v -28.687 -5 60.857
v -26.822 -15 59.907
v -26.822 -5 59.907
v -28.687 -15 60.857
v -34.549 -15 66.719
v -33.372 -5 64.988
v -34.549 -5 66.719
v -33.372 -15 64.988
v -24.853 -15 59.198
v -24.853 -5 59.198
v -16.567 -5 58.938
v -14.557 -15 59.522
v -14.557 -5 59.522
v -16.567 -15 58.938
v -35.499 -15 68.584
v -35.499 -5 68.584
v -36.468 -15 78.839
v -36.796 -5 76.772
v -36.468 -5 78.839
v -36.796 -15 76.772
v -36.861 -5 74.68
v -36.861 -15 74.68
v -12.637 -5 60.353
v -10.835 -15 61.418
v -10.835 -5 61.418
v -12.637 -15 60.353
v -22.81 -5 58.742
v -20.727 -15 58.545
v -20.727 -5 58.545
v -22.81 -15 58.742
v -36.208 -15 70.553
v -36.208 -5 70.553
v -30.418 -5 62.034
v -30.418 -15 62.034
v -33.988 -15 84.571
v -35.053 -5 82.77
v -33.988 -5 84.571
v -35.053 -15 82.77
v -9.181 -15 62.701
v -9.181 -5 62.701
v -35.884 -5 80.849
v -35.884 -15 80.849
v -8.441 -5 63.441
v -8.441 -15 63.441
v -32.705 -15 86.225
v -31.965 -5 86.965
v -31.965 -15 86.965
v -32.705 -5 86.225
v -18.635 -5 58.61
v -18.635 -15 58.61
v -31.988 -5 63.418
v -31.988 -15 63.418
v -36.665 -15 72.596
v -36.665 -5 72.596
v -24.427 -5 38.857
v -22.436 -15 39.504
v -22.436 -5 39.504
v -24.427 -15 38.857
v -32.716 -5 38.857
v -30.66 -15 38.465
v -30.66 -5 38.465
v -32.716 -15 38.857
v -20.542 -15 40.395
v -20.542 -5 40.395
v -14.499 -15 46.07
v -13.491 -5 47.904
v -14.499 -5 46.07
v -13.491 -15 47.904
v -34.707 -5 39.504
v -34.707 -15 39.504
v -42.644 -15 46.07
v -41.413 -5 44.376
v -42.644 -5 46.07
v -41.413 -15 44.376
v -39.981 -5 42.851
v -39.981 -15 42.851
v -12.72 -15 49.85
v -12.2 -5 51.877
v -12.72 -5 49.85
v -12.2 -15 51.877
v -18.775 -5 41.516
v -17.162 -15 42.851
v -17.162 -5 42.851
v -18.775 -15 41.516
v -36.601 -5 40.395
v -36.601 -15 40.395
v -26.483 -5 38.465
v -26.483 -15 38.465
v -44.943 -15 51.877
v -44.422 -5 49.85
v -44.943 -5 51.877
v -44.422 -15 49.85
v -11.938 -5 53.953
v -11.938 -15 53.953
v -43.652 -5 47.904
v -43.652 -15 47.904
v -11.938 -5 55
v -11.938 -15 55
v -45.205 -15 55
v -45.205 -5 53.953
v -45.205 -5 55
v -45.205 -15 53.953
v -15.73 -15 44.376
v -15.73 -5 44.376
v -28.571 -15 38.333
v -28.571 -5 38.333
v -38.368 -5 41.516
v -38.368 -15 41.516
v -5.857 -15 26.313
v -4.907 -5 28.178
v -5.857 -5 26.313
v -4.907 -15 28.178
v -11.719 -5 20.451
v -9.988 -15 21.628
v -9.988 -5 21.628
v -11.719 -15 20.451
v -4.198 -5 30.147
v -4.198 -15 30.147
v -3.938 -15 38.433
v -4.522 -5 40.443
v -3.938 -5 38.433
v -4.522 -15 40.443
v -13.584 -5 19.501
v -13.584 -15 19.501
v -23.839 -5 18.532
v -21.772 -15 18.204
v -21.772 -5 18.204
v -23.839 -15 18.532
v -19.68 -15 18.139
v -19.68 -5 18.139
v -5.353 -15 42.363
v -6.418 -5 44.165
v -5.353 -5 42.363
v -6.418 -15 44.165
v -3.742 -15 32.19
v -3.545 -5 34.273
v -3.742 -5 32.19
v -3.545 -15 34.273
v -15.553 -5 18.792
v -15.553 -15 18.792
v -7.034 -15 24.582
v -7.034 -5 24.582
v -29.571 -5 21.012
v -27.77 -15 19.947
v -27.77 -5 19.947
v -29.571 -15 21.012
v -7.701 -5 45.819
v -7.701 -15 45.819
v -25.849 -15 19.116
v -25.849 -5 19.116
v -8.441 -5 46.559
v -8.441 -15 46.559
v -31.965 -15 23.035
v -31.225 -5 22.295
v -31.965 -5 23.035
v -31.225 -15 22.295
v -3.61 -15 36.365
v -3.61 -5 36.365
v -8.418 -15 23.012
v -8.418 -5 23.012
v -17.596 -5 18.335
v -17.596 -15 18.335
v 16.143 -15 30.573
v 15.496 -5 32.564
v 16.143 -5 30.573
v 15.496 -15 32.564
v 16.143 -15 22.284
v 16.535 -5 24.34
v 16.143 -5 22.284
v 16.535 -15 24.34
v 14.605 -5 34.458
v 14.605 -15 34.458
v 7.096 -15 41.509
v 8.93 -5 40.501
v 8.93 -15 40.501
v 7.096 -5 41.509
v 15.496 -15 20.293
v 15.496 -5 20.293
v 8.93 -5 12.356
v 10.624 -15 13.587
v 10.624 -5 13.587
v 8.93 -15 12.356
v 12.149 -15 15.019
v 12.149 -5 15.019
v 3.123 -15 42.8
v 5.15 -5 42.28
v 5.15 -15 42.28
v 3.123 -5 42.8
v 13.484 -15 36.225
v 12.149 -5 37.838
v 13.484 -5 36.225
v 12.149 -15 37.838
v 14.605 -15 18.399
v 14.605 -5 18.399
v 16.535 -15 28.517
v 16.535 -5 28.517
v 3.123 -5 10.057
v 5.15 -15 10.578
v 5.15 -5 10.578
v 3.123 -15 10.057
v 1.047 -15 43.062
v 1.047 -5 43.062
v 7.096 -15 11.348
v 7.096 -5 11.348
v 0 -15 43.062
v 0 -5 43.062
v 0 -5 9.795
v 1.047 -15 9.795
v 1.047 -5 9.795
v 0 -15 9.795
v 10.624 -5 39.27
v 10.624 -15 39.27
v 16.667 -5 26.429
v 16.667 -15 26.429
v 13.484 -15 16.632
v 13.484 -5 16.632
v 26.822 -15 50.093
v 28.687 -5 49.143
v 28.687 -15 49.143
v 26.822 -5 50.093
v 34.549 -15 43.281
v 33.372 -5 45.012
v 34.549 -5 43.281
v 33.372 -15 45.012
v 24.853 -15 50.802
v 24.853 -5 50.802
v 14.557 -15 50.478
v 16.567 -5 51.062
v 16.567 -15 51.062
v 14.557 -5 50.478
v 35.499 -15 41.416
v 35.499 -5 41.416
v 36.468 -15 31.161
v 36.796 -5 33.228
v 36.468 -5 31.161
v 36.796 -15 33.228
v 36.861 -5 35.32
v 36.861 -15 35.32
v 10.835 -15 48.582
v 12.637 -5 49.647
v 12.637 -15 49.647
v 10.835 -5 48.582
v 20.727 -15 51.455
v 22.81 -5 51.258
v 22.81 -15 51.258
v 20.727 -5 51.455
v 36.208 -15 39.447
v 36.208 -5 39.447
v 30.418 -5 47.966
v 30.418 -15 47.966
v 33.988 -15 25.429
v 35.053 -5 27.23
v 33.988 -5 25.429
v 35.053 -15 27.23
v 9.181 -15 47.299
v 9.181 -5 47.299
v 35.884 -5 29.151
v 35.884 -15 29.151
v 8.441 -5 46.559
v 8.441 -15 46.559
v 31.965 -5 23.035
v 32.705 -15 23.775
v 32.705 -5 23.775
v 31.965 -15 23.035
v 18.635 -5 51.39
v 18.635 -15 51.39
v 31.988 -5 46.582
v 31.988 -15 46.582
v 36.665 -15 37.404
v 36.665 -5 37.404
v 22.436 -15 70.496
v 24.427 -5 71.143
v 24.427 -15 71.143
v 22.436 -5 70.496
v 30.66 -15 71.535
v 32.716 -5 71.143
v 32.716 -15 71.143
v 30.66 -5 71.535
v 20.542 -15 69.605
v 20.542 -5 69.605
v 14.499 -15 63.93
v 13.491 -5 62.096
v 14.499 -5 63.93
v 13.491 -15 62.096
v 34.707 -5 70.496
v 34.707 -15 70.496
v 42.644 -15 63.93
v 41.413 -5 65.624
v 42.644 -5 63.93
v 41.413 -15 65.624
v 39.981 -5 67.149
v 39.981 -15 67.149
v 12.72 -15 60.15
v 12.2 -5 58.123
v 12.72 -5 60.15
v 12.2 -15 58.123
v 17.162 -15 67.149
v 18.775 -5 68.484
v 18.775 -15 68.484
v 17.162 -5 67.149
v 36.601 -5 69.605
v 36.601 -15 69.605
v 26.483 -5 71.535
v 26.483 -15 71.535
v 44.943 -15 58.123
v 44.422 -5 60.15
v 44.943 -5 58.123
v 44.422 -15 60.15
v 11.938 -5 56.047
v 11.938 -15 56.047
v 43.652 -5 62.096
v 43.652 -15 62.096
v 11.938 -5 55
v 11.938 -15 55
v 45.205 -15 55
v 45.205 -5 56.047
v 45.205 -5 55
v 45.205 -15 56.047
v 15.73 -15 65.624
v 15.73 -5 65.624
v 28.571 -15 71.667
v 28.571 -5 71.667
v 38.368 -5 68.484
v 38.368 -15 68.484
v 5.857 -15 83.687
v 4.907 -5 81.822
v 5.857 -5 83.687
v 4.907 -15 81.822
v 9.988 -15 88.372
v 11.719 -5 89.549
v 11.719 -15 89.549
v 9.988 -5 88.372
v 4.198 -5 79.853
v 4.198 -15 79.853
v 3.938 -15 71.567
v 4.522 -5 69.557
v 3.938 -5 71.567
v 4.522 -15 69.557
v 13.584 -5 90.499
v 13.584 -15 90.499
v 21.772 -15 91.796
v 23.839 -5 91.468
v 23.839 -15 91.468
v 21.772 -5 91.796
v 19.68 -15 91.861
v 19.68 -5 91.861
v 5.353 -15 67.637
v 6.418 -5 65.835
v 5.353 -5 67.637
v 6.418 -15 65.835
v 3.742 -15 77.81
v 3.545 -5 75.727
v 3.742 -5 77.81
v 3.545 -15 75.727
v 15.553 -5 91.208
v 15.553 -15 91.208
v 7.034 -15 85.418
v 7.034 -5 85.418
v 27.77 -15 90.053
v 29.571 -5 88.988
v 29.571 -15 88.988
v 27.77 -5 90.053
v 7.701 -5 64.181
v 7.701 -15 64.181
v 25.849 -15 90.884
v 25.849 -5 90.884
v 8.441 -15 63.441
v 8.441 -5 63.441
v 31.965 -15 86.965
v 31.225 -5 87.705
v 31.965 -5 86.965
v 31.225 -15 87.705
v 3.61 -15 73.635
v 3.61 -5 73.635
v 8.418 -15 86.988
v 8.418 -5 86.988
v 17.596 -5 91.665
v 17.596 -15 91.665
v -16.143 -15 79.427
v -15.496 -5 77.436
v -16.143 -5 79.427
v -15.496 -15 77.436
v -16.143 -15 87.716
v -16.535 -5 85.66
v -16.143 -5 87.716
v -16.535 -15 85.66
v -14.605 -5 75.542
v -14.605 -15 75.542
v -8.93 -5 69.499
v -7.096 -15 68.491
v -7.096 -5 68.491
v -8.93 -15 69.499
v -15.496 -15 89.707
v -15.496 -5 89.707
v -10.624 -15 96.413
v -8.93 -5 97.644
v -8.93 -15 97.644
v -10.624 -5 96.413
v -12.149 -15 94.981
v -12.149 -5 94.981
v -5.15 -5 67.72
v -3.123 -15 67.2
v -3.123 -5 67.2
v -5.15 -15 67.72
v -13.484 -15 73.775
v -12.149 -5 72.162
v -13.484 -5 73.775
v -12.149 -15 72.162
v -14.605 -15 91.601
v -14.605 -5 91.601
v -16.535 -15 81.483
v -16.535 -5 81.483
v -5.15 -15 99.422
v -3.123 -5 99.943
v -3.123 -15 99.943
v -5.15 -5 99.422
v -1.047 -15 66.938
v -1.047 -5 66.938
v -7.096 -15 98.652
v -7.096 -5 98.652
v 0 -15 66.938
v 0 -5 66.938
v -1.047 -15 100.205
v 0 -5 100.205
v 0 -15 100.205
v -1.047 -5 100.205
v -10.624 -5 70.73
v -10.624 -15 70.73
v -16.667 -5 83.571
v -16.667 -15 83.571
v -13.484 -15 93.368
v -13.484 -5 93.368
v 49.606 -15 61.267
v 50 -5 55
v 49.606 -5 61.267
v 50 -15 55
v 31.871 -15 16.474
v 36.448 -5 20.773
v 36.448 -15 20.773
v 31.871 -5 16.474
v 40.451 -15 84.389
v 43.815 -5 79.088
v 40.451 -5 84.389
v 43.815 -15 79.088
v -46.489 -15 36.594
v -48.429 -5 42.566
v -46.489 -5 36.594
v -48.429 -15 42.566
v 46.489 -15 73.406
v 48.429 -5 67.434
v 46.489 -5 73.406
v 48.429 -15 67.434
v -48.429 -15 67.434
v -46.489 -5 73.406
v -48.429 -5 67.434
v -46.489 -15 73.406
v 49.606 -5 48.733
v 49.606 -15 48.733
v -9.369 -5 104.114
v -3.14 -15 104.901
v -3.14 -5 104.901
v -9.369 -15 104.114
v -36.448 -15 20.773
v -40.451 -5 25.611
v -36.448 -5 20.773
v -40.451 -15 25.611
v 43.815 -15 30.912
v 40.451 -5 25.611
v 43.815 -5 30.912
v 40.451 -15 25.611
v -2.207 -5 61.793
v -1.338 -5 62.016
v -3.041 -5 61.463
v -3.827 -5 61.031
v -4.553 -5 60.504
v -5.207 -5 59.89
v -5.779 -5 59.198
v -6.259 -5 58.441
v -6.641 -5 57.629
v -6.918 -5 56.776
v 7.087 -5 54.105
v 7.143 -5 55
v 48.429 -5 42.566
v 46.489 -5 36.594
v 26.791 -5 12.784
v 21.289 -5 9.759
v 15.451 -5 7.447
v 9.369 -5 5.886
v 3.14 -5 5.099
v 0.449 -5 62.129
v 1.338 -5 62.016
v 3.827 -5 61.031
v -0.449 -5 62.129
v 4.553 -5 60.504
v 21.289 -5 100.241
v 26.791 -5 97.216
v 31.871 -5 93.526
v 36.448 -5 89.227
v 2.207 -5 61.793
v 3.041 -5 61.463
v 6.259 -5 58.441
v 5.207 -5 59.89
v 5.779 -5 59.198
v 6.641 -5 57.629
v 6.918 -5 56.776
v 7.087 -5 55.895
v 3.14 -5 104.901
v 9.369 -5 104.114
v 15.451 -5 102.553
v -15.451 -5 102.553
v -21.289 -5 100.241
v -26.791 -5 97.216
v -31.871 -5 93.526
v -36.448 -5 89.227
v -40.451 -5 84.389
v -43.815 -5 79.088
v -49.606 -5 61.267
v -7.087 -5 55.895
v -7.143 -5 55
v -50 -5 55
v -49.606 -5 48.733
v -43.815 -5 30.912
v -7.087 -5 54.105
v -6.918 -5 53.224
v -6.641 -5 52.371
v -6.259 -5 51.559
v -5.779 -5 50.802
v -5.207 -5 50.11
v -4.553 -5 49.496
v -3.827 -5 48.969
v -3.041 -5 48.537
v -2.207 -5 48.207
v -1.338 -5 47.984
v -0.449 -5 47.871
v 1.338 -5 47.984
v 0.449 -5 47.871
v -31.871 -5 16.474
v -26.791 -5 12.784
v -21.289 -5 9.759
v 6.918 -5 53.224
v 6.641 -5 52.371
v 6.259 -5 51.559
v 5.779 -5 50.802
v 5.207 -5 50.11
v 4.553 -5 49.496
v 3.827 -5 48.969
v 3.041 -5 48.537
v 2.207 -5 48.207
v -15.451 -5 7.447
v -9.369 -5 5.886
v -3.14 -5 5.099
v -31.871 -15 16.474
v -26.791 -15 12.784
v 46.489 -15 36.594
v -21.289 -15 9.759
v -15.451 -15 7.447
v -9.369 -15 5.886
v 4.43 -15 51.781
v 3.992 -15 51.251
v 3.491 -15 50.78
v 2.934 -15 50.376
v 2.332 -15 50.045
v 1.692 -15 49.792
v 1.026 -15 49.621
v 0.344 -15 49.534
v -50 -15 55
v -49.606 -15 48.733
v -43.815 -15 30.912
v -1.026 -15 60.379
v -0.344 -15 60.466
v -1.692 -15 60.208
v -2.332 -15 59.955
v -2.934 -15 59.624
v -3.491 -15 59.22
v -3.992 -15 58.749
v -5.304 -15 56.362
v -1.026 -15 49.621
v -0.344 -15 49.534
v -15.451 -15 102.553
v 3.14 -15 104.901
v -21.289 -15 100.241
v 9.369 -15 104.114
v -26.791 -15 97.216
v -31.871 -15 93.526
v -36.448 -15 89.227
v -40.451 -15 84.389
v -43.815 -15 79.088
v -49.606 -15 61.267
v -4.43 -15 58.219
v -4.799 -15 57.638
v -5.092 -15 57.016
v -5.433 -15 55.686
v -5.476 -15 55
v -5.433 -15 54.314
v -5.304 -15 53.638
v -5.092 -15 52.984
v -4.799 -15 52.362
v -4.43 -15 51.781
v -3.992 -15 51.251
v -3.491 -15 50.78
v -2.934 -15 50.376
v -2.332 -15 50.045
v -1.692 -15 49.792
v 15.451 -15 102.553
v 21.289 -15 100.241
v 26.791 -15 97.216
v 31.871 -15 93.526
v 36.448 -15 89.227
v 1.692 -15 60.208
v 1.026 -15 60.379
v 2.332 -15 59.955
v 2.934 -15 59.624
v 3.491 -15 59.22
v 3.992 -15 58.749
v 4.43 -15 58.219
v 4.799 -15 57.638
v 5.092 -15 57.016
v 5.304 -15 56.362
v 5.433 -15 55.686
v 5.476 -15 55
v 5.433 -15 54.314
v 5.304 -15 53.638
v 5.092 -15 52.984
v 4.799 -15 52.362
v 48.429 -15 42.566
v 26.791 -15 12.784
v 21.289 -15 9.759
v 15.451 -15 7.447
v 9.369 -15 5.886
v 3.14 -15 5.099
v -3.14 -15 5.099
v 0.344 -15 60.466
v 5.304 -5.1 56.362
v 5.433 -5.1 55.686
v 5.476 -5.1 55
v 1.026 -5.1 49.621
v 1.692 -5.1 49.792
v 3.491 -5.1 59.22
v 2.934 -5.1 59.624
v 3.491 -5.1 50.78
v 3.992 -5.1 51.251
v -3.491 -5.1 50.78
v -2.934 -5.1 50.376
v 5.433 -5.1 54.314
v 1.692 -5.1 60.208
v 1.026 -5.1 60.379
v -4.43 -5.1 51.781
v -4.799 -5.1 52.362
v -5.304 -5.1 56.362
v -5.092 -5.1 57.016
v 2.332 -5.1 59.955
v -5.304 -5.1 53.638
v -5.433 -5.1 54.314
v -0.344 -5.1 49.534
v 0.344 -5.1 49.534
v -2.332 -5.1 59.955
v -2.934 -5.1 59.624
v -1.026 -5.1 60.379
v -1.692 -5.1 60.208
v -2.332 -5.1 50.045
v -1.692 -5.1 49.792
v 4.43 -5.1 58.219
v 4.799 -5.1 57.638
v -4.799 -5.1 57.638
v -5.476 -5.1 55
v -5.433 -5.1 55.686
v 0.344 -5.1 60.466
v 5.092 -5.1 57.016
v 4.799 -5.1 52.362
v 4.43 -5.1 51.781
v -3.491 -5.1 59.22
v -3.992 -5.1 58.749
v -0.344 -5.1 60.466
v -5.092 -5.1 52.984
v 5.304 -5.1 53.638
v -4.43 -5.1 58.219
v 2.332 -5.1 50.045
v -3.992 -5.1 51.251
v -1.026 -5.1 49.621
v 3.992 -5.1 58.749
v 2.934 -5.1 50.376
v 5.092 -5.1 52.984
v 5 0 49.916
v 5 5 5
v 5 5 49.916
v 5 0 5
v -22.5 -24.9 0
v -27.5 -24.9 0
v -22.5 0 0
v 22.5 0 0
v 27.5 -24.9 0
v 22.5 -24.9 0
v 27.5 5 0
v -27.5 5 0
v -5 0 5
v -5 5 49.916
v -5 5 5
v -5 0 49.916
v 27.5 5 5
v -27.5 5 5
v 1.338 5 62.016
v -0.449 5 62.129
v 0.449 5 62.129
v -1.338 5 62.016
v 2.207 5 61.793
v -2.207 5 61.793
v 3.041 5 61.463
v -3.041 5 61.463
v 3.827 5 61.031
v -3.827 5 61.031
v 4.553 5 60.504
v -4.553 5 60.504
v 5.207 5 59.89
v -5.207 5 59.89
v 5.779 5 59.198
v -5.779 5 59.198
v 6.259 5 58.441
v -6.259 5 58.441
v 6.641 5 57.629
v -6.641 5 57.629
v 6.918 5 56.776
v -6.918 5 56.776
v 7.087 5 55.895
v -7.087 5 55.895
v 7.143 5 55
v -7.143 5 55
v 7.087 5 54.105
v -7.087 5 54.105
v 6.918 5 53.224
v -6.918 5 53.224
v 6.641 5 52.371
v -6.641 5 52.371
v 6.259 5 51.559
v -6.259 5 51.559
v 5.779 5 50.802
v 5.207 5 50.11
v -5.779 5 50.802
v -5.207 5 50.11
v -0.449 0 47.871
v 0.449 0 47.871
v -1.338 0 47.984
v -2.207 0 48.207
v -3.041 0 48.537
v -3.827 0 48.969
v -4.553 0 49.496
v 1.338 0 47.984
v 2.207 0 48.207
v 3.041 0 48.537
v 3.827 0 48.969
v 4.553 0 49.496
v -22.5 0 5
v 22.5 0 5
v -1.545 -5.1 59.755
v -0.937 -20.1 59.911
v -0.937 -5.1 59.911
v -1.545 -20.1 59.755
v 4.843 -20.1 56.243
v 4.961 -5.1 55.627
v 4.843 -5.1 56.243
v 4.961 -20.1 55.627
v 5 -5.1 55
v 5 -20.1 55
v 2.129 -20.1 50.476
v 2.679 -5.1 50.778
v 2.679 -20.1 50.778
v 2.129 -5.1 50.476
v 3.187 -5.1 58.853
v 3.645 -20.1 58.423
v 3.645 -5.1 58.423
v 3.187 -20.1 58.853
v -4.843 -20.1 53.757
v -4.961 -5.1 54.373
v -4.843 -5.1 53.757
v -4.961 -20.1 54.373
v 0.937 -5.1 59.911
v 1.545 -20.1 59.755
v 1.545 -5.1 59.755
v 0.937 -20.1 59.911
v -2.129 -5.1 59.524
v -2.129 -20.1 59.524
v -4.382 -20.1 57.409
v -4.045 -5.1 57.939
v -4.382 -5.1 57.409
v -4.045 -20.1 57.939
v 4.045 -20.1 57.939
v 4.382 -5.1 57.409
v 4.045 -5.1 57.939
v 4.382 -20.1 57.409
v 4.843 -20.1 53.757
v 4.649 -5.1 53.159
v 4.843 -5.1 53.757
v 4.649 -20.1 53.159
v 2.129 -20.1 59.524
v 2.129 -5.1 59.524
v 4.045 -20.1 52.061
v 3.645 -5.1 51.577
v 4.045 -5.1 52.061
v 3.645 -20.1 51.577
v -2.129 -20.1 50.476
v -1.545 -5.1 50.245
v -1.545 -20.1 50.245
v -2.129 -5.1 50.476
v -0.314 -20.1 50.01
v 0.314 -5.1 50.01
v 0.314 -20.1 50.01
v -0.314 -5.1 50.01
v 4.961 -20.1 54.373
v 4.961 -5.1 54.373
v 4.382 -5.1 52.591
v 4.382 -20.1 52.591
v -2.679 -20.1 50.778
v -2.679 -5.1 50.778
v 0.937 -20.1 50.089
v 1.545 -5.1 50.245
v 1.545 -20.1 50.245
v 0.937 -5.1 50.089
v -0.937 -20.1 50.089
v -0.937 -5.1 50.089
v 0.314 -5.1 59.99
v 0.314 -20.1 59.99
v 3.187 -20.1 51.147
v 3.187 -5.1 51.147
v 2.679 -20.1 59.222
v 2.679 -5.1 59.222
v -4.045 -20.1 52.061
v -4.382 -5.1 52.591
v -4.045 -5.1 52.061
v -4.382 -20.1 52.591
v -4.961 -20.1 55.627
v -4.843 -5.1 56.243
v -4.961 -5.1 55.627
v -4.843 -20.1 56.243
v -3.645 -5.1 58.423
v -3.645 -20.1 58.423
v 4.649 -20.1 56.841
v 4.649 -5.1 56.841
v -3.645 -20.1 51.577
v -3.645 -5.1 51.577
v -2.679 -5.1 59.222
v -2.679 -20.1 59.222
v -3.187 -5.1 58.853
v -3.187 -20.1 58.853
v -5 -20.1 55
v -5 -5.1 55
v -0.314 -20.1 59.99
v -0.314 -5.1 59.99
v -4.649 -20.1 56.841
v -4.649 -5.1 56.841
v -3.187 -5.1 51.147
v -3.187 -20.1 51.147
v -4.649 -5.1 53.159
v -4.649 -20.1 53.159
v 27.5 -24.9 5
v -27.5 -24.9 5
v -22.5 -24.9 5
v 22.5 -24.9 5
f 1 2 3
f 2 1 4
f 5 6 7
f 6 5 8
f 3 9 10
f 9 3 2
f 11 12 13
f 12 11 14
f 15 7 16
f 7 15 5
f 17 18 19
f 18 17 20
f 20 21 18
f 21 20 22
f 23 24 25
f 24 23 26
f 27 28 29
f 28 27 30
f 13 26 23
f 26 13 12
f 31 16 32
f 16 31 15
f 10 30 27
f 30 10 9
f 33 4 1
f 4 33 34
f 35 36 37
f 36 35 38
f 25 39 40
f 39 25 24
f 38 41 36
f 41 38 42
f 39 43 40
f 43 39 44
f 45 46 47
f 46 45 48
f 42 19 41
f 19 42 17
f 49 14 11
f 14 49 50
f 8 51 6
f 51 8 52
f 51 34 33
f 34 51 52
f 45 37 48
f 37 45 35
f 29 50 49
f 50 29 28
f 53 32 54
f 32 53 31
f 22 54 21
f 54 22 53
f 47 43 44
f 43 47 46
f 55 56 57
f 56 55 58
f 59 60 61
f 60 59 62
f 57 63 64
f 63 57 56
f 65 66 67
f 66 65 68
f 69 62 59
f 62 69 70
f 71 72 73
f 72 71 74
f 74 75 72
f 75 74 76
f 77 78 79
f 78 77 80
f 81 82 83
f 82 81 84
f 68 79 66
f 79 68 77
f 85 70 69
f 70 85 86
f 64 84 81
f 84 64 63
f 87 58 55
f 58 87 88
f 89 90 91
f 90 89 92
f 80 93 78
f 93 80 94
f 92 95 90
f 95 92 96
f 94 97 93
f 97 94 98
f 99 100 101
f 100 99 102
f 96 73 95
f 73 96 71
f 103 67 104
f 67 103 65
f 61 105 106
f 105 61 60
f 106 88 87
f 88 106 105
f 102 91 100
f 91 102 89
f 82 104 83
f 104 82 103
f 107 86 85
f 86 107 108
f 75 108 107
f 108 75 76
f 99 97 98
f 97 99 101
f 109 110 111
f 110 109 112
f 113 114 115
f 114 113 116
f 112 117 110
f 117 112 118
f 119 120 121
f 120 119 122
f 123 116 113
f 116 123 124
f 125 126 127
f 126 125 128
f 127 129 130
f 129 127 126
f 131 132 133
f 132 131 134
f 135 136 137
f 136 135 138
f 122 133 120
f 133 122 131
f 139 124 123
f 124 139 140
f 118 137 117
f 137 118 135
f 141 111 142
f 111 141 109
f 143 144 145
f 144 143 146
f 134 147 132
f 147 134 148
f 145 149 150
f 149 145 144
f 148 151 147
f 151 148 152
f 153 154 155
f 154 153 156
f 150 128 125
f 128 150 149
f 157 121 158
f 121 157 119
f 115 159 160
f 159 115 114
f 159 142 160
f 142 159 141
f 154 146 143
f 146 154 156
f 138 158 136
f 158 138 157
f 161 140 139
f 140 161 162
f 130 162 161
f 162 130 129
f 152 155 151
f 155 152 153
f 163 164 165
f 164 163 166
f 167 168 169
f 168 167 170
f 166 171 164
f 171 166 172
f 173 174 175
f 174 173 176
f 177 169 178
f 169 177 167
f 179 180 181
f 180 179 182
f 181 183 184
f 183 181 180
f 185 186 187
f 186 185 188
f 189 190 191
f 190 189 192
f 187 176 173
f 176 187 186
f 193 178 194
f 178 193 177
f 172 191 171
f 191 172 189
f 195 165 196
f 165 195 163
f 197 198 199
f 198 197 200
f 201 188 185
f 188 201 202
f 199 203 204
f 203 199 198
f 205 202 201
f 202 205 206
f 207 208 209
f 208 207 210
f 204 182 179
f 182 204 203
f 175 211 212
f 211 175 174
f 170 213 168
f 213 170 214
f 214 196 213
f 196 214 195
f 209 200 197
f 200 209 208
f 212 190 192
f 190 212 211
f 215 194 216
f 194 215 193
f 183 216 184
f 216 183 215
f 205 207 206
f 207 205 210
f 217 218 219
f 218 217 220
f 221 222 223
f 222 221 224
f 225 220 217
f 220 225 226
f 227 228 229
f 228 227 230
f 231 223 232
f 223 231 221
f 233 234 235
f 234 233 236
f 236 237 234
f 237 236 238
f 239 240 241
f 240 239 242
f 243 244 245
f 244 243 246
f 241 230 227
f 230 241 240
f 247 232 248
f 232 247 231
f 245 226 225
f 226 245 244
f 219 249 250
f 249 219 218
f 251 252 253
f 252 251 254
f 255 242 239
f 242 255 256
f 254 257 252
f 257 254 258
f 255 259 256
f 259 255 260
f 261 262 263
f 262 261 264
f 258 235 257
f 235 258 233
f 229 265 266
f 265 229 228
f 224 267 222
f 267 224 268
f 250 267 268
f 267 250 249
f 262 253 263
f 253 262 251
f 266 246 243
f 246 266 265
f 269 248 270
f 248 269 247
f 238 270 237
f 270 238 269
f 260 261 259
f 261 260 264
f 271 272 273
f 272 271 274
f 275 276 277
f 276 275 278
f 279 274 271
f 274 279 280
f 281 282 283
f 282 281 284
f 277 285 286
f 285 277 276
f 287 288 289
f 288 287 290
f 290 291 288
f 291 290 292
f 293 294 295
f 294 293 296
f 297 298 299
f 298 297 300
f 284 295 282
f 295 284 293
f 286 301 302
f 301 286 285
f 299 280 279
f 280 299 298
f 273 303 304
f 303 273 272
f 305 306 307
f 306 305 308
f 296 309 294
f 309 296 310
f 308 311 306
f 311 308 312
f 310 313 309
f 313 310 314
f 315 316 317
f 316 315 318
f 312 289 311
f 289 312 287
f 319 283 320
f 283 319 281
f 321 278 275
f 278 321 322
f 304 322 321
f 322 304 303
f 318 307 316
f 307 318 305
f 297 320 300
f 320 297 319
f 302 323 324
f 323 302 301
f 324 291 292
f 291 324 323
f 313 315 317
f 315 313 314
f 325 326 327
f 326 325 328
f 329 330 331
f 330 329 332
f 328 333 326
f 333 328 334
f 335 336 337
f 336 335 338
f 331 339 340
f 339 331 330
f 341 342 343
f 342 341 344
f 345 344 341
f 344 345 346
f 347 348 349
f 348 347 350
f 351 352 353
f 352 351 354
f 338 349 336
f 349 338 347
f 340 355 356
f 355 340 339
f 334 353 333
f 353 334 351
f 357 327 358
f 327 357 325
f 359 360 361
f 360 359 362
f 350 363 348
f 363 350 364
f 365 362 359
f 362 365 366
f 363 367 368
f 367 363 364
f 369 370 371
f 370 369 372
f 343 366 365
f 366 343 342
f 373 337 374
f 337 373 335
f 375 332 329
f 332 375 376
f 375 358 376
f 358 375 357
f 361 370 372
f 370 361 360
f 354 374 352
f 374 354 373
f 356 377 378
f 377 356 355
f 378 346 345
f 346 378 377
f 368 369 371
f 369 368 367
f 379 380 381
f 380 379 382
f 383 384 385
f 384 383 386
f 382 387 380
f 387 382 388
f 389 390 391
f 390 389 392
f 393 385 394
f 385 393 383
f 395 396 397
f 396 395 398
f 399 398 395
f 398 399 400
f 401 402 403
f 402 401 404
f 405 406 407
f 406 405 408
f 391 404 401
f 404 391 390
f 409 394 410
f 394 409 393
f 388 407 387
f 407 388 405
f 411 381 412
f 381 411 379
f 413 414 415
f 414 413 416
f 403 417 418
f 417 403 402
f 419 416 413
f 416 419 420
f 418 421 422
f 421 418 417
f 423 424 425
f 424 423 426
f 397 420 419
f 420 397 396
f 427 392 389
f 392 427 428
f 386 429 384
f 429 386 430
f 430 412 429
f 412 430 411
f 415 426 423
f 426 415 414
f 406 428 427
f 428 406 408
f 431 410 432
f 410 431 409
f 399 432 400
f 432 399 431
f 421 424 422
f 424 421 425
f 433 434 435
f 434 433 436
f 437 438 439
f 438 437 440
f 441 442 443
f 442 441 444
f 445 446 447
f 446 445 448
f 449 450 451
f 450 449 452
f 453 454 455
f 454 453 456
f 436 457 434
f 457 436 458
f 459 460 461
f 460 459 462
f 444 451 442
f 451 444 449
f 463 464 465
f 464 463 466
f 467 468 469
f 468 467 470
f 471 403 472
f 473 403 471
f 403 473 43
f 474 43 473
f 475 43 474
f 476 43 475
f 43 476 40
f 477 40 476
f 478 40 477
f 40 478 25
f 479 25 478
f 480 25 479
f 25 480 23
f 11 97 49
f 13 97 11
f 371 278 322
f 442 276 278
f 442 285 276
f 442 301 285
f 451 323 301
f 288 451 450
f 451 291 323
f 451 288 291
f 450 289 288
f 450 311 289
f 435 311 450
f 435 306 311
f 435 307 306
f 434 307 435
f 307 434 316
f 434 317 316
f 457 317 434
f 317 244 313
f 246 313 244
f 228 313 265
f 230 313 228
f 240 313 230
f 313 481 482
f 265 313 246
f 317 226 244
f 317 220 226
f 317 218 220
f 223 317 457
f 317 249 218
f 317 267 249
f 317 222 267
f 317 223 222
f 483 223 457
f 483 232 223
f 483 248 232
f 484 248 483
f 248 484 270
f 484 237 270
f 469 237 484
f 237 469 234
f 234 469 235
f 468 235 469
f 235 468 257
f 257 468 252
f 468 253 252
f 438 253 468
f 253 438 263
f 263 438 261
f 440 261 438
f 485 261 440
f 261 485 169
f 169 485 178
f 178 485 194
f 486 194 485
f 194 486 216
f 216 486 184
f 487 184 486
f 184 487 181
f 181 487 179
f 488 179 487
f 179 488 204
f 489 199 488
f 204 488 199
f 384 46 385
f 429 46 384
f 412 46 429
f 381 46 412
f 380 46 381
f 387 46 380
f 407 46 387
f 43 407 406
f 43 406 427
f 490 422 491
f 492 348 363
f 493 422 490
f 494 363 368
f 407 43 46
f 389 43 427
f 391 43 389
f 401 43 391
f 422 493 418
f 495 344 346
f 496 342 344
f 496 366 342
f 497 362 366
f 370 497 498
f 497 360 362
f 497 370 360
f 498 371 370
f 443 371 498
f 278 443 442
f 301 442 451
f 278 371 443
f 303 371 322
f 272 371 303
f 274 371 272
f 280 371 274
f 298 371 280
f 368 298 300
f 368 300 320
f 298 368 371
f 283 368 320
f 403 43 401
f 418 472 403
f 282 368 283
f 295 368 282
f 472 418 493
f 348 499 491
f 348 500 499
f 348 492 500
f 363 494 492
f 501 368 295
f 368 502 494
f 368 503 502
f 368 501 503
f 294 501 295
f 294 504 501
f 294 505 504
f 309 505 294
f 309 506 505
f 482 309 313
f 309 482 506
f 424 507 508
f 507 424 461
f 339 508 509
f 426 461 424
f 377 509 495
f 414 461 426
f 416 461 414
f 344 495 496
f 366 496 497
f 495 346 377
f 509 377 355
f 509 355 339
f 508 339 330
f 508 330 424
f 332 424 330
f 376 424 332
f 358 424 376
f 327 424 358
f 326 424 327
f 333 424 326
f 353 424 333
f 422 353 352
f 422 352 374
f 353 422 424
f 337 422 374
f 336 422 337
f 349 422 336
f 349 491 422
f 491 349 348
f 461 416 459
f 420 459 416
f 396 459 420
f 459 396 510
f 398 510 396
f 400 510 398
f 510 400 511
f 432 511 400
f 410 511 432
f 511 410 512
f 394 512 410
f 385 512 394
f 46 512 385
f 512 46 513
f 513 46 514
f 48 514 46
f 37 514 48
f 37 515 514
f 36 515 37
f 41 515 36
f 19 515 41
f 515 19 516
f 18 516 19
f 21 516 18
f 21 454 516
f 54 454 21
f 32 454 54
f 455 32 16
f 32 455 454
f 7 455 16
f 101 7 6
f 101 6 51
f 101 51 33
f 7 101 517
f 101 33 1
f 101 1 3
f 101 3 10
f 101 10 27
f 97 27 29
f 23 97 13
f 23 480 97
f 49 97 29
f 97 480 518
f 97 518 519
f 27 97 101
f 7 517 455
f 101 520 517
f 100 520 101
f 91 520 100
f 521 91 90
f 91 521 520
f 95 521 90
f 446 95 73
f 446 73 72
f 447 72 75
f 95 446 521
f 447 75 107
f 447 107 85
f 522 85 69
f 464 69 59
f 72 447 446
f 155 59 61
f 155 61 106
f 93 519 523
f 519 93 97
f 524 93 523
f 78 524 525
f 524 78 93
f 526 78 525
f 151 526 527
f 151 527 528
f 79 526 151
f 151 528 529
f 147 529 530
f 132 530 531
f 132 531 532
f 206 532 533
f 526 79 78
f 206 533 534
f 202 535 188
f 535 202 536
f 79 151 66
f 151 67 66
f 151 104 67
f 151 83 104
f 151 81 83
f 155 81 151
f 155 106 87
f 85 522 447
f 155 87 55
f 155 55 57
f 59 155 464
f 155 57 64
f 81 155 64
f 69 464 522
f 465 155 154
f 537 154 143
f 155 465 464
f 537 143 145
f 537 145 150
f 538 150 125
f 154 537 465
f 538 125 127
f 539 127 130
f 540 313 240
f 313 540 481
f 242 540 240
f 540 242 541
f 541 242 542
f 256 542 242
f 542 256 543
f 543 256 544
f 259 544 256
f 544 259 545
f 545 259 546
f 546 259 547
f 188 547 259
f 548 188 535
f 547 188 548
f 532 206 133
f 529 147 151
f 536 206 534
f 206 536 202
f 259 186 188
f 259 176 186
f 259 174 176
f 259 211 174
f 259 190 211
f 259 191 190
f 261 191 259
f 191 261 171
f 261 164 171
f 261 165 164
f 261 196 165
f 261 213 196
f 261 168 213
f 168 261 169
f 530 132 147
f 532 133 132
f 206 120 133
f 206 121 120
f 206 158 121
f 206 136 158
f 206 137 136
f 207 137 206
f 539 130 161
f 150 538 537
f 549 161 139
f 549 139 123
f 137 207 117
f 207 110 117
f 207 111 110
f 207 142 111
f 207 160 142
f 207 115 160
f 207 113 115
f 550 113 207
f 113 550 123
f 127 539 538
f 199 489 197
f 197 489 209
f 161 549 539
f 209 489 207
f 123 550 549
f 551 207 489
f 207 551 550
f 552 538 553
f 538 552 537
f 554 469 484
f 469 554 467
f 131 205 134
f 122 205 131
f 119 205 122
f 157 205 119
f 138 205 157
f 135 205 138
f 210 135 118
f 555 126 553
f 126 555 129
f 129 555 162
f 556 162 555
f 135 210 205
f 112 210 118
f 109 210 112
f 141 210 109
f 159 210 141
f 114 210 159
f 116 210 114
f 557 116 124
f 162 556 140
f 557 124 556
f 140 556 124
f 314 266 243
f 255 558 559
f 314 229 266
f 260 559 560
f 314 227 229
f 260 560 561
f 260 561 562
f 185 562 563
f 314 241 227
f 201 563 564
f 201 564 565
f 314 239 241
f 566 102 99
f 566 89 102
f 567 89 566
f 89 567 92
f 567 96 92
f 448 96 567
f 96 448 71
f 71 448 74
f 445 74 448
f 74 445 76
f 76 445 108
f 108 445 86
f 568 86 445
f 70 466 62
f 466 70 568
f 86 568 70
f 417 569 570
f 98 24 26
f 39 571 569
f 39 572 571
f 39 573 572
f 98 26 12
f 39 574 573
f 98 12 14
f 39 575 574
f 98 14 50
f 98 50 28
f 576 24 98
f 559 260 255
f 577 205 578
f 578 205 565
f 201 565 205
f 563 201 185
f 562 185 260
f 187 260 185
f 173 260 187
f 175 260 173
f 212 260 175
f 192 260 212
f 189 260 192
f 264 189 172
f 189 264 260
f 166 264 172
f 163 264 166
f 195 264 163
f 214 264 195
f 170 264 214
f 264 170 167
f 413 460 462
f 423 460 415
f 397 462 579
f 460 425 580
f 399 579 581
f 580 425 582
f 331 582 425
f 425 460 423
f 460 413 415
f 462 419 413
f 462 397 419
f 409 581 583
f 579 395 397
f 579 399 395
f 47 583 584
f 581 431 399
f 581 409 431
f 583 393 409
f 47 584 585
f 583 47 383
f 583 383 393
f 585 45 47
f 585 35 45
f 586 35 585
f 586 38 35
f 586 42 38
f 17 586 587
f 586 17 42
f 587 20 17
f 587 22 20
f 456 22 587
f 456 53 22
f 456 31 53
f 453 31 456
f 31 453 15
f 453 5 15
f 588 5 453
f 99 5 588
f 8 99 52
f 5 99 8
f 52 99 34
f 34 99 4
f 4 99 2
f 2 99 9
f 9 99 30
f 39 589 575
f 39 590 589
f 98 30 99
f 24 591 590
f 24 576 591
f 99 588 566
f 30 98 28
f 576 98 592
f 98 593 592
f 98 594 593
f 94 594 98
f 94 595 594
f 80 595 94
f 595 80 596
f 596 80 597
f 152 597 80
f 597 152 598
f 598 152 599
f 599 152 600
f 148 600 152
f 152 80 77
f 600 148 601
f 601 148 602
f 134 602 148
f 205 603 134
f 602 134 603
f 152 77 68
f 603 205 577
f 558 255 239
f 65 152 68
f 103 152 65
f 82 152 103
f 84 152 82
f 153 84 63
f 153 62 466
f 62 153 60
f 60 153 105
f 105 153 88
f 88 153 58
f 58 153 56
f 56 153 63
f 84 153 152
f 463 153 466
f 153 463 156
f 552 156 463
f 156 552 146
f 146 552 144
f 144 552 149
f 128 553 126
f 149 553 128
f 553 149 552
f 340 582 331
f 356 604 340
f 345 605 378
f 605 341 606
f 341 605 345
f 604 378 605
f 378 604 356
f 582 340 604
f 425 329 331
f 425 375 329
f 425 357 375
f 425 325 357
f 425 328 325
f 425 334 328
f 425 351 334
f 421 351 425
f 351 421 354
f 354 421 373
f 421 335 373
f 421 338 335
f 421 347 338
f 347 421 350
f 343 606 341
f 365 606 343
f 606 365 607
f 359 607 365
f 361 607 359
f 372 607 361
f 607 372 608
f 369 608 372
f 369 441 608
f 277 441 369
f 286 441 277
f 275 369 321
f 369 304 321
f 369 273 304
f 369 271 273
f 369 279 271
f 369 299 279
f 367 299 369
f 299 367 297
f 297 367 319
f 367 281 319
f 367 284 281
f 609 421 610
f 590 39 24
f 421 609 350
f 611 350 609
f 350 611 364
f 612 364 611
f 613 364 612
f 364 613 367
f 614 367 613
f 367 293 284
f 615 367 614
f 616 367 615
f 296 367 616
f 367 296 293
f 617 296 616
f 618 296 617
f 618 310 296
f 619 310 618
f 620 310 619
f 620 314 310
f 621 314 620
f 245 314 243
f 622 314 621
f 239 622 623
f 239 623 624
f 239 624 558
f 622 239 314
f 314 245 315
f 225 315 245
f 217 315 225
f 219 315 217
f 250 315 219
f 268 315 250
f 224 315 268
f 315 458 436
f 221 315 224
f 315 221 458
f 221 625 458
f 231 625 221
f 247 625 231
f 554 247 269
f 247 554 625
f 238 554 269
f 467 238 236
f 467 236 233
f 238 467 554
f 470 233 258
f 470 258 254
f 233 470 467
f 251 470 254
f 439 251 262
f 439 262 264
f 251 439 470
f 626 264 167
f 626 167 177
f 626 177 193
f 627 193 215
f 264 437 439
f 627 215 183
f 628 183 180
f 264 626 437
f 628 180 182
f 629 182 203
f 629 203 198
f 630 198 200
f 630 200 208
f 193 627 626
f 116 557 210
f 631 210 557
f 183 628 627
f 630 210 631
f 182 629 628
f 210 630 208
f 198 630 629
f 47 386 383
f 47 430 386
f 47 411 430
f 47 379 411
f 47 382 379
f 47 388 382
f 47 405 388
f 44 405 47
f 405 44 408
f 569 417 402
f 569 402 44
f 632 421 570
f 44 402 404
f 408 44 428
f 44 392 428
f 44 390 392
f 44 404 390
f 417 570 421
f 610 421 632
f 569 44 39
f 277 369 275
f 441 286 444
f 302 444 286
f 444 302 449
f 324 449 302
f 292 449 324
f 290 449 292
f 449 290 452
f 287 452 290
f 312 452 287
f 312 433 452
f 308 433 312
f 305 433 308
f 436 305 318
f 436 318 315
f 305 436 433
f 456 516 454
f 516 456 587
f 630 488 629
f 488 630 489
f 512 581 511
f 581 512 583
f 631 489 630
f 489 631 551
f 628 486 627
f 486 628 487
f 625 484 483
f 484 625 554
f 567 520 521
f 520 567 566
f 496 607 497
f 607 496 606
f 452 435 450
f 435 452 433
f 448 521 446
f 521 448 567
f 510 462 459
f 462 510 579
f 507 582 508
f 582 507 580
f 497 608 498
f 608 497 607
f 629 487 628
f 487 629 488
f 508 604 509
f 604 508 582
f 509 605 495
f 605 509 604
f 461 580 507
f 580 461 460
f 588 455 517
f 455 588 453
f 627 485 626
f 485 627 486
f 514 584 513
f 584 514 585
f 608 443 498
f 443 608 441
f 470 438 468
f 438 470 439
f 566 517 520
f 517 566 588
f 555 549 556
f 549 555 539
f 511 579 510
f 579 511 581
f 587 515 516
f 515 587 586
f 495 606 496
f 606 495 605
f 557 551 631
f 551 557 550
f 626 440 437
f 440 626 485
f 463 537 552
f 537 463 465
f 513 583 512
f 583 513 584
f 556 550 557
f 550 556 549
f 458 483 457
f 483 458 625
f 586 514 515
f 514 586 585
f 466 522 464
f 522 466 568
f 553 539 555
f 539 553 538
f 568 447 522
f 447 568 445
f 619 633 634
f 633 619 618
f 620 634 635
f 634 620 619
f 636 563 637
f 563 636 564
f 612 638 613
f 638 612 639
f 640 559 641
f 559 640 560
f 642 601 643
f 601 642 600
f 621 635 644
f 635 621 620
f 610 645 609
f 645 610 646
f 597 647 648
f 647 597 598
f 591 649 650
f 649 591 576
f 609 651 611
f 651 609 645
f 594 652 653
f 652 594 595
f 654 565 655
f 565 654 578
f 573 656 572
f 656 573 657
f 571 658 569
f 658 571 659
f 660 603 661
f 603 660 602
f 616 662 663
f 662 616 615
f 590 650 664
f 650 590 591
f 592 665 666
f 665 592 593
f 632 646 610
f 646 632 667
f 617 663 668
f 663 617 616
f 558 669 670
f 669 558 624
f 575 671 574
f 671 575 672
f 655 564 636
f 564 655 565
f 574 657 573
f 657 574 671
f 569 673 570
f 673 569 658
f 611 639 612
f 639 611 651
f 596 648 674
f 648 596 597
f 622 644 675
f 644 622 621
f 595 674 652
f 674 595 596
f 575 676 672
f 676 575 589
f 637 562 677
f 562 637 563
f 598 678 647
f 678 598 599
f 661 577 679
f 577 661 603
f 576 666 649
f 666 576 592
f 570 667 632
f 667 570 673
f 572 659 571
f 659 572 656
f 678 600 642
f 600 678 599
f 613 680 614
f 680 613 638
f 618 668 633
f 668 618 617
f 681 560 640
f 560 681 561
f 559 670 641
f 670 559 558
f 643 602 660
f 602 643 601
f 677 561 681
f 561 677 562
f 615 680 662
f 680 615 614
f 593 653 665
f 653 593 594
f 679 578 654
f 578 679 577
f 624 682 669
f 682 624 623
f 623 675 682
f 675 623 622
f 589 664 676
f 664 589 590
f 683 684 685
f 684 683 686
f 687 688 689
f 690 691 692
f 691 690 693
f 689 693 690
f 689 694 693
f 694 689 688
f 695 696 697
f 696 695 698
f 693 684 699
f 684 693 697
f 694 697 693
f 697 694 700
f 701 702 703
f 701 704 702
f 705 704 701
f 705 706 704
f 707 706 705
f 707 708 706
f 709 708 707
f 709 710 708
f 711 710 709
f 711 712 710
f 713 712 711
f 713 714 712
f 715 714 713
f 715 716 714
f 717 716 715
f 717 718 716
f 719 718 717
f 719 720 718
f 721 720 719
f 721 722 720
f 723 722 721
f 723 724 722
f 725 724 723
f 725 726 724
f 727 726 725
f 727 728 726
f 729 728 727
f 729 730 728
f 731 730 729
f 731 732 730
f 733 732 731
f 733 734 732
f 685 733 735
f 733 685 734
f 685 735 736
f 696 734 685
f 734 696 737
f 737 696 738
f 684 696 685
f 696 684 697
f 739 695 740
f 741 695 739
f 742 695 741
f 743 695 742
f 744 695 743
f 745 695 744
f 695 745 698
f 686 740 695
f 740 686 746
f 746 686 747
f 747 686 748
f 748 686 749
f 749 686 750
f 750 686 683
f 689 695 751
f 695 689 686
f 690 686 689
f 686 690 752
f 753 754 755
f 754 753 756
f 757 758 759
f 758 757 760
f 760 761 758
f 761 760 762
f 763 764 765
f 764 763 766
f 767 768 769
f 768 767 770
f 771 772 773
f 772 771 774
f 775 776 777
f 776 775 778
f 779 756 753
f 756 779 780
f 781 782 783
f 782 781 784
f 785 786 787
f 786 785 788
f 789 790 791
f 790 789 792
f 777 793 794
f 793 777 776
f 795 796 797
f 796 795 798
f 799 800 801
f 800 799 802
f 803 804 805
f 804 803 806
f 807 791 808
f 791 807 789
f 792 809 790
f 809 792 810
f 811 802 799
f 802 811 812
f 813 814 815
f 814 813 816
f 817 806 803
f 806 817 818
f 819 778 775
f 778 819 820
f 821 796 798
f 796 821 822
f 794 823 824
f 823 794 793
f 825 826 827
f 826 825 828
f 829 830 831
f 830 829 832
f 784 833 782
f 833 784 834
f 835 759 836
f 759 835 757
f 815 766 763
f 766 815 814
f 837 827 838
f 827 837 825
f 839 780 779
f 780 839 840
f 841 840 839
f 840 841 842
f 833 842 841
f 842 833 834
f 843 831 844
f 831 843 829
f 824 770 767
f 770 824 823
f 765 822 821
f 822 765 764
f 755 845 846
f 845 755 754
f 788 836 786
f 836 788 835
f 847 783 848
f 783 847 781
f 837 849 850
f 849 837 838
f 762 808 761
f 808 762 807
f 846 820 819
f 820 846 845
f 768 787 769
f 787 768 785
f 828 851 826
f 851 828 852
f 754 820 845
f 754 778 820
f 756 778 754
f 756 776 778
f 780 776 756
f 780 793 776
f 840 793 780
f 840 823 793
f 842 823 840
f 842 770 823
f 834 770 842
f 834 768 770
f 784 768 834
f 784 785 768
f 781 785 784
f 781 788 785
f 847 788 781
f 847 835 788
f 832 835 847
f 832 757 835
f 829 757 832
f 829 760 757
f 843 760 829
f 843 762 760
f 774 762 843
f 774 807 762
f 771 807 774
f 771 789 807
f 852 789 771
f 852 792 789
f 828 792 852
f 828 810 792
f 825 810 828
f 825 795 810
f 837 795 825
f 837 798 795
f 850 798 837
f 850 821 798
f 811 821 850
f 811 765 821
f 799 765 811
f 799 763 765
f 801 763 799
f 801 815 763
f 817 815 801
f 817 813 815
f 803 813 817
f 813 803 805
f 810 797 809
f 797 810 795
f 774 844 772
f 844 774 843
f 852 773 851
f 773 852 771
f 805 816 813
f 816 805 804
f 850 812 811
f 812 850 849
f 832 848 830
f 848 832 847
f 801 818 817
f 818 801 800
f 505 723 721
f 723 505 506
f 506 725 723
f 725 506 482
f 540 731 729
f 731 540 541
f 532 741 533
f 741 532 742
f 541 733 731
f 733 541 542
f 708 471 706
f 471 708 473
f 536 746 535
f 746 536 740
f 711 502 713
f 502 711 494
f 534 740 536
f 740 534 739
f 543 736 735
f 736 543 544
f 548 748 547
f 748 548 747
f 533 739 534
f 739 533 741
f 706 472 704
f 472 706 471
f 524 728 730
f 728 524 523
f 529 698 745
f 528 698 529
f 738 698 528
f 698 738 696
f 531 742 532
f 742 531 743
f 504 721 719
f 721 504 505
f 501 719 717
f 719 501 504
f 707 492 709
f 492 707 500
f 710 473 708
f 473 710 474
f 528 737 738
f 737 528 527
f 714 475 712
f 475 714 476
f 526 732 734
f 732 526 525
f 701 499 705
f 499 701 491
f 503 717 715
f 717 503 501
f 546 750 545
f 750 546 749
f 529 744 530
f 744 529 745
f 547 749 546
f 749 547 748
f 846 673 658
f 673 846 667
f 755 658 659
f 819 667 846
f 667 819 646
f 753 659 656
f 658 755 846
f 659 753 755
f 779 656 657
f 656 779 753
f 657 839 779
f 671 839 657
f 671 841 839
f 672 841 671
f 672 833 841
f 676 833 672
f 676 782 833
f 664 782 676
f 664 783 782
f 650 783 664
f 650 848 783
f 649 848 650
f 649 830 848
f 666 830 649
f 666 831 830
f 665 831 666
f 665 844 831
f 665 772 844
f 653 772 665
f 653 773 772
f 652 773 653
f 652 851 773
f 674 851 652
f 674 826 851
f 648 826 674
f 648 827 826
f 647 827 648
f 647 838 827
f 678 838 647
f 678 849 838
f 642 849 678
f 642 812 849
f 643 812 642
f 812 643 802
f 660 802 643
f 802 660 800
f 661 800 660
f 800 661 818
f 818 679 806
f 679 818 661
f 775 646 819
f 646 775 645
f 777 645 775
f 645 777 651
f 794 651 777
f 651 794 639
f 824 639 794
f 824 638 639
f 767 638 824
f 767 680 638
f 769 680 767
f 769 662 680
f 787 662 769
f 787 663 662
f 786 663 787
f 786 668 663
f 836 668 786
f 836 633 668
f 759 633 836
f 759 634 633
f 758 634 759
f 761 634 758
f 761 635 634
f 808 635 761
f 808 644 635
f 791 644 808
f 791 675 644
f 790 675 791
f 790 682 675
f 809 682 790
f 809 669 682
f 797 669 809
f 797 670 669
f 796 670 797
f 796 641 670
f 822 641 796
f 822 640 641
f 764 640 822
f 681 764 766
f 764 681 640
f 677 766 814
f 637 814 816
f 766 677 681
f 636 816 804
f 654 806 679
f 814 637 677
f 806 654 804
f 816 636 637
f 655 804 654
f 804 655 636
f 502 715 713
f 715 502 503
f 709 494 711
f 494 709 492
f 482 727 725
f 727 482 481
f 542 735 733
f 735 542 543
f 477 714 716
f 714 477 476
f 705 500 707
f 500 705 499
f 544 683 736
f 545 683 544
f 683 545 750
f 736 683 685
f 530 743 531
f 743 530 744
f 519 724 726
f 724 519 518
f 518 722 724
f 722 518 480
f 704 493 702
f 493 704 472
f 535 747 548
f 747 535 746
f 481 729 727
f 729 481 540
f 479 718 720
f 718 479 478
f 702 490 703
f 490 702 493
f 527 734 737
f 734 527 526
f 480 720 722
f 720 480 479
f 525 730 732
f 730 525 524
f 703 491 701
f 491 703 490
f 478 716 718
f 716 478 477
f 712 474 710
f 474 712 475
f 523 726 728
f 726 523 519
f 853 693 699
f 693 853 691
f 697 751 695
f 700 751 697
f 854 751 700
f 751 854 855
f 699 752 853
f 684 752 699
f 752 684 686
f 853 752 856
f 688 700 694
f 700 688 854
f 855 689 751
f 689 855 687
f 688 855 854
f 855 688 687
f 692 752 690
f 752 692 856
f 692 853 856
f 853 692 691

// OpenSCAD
// [FL_INDEX: keywords="openscad, 3d_parametric, Customizable_Perpetual_Motion_Wheel, csg_solid" | COT="Parametric OpenSCAD design from 3DCodeverse"]
// Title: Customizable Perpetual Motion Wheel

//Overbalanced wheel
$fn = 50;
mode = "preview"; //[preview, print]
num_of_holes = 8; //[3:9]
//Change size of wheel, other dependent parts change too.
wheel_size = 50; //[20:100]
wheel_thickness = 10; //[5:20]
fizz = 0.1;
fizzz = fizz*2;
rot = 360/num_of_holes;
dikte = wheel_size/10;

start();

module start(){
	if (mode == "print"){
		 color("green") wheel();
		translate([-wheel_size*1.8,-wheel_size*.5,dikte]) rotate(-90,[1,0,0]) color("blue") stand();
		translate([-wheel_size*1.8,wheel_size*1.3,0]) color("red") weights();
	} else {
		translate([0,-wheel_thickness/2,wheel_size + wheel_size/10]) rotate(90,[1,0,0]) color("green") wheel();
		color("blue")  stand();
	}
}

module weights(){
	for (nr=[1:num_of_holes]){
		translate([dikte*2.5*nr,0,0]) weight();
	}
}

module weight(){
	cylinder(wheel_thickness/2-fizzz,dikte,dikte);
	translate([0,0,wheel_thickness/2]) cylinder(wheel_thickness+fizzz*2, dikte/2, dikte/2);
	translate([0,0,wheel_thickness/2+wheel_thickness]) cylinder(wheel_thickness/2-fizzz,dikte,dikte);
}

module stand(){
	//vertical
	translate([-dikte,0,0]) cube([dikte*2,dikte,wheel_size + wheel_size/10]);
	//hangert
	translate([0,dikte,wheel_size + wheel_size/10]) rotate(90,[1,0,0]) cylinder(wheel_thickness*2+dikte+fizz,wheel_size/10,wheel_size/10);
	//tegenhouder
	translate([0,dikte,wheel_size + wheel_size/10]) rotate(90,[1,0,0]) cylinder(wheel_thickness/2+dikte+fizz,wheel_size/7,wheel_size/7);
	//horizontal
	trans_x = (wheel_size + wheel_size/10)/2;
	translate([-trans_x,0,0]) cube([wheel_size + wheel_size/10,dikte,dikte]);
	//pootjes
	translate([-trans_x,-(wheel_thickness*2.5)+fizz,0]) cube([dikte,wheel_thickness*2.5,dikte]);
	translate([trans_x - dikte,-(wheel_thickness*2.5)+fizz,0]) cube([dikte,wheel_thickness*2.5,dikte]);
}

module wheel(){
	difference(){
		cylinder(wheel_thickness, wheel_size, wheel_size);
		//Holes
		for (nr=[1:num_of_holes]){
			rotate(rot*nr,[0,0,1]) translate([0,wheel_size/1.75,0]) hole();
		}
		//Center
		translate([0,0,-fizz]) cylinder(wheel_thickness+fizzz,wheel_size/9.3+fizz,wheel_size/9.3+fizz);
	}
}

module hole(){
	difference(){
		translate([0,0,-fizz]) cylinder(wheel_thickness+fizzz, wheel_size/3, wheel_size/3);
		translate([0,-wheel_size/2,-fizzz]) cube([wheel_size,wheel_size,wheel_size]);
	}
}
